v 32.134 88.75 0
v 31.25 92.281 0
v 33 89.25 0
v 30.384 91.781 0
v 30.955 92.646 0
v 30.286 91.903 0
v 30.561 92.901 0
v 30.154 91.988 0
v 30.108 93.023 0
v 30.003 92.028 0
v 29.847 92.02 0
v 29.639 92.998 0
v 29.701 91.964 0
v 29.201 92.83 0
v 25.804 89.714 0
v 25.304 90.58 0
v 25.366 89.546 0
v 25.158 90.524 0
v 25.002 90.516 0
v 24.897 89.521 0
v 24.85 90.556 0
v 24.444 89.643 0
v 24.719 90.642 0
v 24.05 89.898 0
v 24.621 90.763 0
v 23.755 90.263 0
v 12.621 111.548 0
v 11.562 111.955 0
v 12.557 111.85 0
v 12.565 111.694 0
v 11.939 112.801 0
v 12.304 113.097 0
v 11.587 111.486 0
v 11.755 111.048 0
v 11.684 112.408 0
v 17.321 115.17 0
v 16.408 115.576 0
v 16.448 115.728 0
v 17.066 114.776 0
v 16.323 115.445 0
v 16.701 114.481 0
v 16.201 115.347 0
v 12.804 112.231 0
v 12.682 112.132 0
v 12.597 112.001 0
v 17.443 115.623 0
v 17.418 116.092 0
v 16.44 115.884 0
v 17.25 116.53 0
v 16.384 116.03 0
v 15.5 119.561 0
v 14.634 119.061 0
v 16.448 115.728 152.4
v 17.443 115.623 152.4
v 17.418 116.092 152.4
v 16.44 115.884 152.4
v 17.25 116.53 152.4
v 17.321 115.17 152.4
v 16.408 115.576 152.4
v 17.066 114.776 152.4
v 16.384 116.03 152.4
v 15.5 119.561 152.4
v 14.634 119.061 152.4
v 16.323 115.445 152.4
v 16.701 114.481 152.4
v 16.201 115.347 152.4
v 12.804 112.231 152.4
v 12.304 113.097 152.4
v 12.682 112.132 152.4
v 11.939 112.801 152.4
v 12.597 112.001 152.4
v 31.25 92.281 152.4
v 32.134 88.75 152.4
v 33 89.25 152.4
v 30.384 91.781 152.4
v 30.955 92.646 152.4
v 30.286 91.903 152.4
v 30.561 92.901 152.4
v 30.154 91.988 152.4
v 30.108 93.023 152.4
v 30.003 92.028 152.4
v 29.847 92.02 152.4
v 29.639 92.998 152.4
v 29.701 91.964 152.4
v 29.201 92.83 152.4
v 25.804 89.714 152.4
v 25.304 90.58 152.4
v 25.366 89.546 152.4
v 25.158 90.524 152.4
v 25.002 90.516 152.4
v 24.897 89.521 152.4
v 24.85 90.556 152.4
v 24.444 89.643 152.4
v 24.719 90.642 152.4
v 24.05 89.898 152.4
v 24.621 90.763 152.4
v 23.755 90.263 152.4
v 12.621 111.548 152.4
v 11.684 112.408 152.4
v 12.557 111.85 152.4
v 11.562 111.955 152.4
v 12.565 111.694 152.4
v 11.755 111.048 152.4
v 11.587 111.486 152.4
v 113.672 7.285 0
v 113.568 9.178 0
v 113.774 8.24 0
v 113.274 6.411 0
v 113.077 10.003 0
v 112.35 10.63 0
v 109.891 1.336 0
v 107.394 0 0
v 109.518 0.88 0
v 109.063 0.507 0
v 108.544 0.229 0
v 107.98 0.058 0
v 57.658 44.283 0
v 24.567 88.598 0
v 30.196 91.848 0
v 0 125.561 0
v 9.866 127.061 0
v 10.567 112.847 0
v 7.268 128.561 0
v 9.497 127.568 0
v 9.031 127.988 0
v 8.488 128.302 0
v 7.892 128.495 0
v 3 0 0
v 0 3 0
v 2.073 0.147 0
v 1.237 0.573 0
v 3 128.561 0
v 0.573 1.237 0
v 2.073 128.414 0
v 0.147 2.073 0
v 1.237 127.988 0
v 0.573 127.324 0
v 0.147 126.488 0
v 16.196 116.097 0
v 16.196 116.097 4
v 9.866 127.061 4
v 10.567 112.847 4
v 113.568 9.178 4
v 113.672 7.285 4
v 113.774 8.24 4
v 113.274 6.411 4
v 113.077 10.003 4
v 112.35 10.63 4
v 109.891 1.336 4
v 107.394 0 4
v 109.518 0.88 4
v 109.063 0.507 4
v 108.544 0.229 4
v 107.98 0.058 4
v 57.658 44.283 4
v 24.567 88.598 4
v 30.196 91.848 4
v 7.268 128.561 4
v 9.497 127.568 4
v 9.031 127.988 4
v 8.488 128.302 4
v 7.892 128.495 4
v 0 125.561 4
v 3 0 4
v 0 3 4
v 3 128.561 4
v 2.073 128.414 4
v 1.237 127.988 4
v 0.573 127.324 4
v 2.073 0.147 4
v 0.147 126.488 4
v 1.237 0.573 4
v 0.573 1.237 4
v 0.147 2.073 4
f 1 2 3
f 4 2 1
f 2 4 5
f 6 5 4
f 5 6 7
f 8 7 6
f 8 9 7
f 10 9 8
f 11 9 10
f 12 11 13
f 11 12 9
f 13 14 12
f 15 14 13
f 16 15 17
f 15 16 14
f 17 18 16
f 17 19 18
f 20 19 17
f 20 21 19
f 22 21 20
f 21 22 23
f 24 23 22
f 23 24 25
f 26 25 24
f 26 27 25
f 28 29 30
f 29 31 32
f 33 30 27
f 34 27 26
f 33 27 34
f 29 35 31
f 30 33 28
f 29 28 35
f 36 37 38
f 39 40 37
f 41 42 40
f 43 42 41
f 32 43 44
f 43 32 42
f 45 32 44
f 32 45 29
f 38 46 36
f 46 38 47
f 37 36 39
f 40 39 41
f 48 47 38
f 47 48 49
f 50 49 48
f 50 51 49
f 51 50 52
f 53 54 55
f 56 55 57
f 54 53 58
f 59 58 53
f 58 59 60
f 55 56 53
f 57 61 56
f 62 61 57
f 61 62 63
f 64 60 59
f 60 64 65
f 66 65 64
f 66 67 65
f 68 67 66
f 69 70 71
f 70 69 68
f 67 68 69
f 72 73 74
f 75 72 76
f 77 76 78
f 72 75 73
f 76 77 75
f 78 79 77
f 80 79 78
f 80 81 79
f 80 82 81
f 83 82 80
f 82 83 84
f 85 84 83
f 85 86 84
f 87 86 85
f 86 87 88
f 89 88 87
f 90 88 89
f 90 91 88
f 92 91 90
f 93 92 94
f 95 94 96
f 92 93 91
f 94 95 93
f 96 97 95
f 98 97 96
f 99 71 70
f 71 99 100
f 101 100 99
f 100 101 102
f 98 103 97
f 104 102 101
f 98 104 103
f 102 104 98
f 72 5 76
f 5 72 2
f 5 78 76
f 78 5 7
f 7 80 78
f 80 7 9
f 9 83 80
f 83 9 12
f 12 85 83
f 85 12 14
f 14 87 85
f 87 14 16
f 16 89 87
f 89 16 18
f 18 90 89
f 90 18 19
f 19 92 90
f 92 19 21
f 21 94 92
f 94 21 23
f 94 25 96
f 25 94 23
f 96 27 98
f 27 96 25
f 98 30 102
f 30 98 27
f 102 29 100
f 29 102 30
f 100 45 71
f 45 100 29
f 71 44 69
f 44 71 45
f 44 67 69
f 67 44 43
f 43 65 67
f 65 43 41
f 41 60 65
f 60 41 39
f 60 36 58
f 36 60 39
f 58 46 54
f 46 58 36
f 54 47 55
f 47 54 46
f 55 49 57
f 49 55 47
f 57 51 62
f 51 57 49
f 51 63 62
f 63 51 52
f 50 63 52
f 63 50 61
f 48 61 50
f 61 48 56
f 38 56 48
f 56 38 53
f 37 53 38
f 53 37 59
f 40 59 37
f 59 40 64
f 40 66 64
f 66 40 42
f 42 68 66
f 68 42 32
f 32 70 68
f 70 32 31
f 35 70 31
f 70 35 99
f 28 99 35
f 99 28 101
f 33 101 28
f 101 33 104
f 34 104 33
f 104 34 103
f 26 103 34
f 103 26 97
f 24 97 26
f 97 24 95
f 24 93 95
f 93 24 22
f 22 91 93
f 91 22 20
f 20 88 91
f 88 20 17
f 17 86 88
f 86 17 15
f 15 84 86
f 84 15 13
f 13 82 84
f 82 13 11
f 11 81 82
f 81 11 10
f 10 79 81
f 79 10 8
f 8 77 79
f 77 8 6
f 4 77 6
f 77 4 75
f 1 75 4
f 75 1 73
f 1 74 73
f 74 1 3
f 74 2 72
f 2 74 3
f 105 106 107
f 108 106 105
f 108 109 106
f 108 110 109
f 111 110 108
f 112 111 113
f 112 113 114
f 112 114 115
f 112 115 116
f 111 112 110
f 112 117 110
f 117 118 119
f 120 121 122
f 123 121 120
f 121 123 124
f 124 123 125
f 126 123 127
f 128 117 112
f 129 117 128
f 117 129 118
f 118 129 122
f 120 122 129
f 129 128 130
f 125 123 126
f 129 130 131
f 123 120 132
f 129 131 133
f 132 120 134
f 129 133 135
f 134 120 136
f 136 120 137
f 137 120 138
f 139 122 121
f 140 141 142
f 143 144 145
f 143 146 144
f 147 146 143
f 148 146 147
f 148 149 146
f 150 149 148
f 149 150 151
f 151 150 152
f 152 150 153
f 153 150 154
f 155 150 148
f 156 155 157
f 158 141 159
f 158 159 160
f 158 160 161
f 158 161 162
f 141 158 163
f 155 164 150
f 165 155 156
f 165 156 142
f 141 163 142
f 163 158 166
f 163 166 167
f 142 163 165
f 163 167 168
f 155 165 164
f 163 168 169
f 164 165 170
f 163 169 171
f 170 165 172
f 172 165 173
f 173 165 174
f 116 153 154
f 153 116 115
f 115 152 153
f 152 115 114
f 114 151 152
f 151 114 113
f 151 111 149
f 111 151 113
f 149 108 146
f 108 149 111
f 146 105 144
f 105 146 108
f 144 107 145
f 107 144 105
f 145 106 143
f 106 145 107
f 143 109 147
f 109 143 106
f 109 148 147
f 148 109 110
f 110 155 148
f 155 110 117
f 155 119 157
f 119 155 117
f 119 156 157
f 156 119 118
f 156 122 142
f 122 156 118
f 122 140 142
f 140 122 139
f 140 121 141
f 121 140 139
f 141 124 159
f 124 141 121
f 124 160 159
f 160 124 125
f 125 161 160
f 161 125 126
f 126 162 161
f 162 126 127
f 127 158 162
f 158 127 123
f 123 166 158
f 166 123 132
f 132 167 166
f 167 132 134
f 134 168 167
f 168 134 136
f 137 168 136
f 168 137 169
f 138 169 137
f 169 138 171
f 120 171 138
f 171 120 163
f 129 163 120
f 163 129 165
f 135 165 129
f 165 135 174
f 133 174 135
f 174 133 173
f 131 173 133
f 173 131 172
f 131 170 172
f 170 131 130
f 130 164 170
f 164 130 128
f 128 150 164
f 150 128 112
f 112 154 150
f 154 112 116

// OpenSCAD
use <polyround.scad>;

module dinRail(
   width=35,         /* DIN rail total width (usually 35) */
   pocket_width=25,  /* width of the indented portion of the rail (usually 25) */
   depth=7.5,        /* Total thickness of the rail */
   thickness=1,      /* Thickness of the rail sheet metal */
   length=6*25.4     /* Length of rail */
) {
    id = 0.5;
    od = id + thickness;

    linear_extrude(length)
    polygon(points=polyRound([
        [  0, 0, 0],
        [  0, width/2 - pocket_width/2, od ],
        [  -depth + thickness, width/2 - pocket_width/2, id ],
        [  -depth + thickness,  width - (width/2 - pocket_width/2), id ],
        [  0, width - (width/2 - pocket_width/2), od ],
        [  0, width, 0 ],
        [  -thickness, width, 0 ],
        [  -thickness, width - (width/2 - pocket_width/2) + thickness, id ],
        [  -depth, width - (width/2 - pocket_width/2) + thickness, od ],
        [  -depth, width/2 - pocket_width/2 - thickness, od ],
        [  -thickness, width/2 - pocket_width/2 - thickness, id ],
        [  -thickness, 0, 0 ],
    ]));
}

module dinStand(
    display_angle=30,      /* Angle back from straight up and down to hold the rail */
    display_height=89.25,  /* Height of the bottom of the rail */
    din_width=35,          /* DIN rail total width (usually 35) */
    din_pocket_width=25,   /* width of the indented portion of the rail (usually 25) */
    din_depth=7.5,         /* Total thickness of the rail */
    din_thickness=1,       /* Thickness of the rail sheet metal */
    toe_angle=55,          /* Angle for the bottom "toe" */
    toe_length=115         /* How far forward the toe comes */
) {
    borders = 9;
    corner_radius = 3;

    module top() {
        rail_skew_height = din_width * cos(display_angle);
        stand_height = display_height + rail_skew_height + borders;

        cutout_x = borders + (stand_height - display_height)*tan(display_angle);

        difference() {
            polygon(points=polyRound([
                [ 0, 0, corner_radius ],
                [ 0, stand_height, corner_radius ],
                [ borders, stand_height, corner_radius ],
                [ borders + tan(display_angle)*(stand_height - borders), borders, 0 ],
                [ borders + tan(display_angle)*(stand_height - borders), 0, 0 ]
            ]));

            translate([cutout_x, display_height])
            rotate([0, 0, display_angle])
            translate([-din_depth+din_thickness, din_width/2-din_pocket_width/2 - din_thickness - 1])
            square([din_depth-din_thickness, din_pocket_width+2*din_thickness+1]);
        }
    }

    module toe() {
        toe_height = (toe_length - borders)/tan(toe_angle);
        polygon(points=polyRound([
            [ borders, 0, 0 ],
            [ borders, toe_height, 0 ],
            [ toe_length, borders, corner_radius ],
            [ toe_length - borders/3*2, 0, corner_radius ],
        ]));
    }

    linear_extrude(4)
    union() {
        top();
        toe();
    }
}

translate([33, 89.25])
rotate([0,0,30])
#dinRail();

dinStand();
